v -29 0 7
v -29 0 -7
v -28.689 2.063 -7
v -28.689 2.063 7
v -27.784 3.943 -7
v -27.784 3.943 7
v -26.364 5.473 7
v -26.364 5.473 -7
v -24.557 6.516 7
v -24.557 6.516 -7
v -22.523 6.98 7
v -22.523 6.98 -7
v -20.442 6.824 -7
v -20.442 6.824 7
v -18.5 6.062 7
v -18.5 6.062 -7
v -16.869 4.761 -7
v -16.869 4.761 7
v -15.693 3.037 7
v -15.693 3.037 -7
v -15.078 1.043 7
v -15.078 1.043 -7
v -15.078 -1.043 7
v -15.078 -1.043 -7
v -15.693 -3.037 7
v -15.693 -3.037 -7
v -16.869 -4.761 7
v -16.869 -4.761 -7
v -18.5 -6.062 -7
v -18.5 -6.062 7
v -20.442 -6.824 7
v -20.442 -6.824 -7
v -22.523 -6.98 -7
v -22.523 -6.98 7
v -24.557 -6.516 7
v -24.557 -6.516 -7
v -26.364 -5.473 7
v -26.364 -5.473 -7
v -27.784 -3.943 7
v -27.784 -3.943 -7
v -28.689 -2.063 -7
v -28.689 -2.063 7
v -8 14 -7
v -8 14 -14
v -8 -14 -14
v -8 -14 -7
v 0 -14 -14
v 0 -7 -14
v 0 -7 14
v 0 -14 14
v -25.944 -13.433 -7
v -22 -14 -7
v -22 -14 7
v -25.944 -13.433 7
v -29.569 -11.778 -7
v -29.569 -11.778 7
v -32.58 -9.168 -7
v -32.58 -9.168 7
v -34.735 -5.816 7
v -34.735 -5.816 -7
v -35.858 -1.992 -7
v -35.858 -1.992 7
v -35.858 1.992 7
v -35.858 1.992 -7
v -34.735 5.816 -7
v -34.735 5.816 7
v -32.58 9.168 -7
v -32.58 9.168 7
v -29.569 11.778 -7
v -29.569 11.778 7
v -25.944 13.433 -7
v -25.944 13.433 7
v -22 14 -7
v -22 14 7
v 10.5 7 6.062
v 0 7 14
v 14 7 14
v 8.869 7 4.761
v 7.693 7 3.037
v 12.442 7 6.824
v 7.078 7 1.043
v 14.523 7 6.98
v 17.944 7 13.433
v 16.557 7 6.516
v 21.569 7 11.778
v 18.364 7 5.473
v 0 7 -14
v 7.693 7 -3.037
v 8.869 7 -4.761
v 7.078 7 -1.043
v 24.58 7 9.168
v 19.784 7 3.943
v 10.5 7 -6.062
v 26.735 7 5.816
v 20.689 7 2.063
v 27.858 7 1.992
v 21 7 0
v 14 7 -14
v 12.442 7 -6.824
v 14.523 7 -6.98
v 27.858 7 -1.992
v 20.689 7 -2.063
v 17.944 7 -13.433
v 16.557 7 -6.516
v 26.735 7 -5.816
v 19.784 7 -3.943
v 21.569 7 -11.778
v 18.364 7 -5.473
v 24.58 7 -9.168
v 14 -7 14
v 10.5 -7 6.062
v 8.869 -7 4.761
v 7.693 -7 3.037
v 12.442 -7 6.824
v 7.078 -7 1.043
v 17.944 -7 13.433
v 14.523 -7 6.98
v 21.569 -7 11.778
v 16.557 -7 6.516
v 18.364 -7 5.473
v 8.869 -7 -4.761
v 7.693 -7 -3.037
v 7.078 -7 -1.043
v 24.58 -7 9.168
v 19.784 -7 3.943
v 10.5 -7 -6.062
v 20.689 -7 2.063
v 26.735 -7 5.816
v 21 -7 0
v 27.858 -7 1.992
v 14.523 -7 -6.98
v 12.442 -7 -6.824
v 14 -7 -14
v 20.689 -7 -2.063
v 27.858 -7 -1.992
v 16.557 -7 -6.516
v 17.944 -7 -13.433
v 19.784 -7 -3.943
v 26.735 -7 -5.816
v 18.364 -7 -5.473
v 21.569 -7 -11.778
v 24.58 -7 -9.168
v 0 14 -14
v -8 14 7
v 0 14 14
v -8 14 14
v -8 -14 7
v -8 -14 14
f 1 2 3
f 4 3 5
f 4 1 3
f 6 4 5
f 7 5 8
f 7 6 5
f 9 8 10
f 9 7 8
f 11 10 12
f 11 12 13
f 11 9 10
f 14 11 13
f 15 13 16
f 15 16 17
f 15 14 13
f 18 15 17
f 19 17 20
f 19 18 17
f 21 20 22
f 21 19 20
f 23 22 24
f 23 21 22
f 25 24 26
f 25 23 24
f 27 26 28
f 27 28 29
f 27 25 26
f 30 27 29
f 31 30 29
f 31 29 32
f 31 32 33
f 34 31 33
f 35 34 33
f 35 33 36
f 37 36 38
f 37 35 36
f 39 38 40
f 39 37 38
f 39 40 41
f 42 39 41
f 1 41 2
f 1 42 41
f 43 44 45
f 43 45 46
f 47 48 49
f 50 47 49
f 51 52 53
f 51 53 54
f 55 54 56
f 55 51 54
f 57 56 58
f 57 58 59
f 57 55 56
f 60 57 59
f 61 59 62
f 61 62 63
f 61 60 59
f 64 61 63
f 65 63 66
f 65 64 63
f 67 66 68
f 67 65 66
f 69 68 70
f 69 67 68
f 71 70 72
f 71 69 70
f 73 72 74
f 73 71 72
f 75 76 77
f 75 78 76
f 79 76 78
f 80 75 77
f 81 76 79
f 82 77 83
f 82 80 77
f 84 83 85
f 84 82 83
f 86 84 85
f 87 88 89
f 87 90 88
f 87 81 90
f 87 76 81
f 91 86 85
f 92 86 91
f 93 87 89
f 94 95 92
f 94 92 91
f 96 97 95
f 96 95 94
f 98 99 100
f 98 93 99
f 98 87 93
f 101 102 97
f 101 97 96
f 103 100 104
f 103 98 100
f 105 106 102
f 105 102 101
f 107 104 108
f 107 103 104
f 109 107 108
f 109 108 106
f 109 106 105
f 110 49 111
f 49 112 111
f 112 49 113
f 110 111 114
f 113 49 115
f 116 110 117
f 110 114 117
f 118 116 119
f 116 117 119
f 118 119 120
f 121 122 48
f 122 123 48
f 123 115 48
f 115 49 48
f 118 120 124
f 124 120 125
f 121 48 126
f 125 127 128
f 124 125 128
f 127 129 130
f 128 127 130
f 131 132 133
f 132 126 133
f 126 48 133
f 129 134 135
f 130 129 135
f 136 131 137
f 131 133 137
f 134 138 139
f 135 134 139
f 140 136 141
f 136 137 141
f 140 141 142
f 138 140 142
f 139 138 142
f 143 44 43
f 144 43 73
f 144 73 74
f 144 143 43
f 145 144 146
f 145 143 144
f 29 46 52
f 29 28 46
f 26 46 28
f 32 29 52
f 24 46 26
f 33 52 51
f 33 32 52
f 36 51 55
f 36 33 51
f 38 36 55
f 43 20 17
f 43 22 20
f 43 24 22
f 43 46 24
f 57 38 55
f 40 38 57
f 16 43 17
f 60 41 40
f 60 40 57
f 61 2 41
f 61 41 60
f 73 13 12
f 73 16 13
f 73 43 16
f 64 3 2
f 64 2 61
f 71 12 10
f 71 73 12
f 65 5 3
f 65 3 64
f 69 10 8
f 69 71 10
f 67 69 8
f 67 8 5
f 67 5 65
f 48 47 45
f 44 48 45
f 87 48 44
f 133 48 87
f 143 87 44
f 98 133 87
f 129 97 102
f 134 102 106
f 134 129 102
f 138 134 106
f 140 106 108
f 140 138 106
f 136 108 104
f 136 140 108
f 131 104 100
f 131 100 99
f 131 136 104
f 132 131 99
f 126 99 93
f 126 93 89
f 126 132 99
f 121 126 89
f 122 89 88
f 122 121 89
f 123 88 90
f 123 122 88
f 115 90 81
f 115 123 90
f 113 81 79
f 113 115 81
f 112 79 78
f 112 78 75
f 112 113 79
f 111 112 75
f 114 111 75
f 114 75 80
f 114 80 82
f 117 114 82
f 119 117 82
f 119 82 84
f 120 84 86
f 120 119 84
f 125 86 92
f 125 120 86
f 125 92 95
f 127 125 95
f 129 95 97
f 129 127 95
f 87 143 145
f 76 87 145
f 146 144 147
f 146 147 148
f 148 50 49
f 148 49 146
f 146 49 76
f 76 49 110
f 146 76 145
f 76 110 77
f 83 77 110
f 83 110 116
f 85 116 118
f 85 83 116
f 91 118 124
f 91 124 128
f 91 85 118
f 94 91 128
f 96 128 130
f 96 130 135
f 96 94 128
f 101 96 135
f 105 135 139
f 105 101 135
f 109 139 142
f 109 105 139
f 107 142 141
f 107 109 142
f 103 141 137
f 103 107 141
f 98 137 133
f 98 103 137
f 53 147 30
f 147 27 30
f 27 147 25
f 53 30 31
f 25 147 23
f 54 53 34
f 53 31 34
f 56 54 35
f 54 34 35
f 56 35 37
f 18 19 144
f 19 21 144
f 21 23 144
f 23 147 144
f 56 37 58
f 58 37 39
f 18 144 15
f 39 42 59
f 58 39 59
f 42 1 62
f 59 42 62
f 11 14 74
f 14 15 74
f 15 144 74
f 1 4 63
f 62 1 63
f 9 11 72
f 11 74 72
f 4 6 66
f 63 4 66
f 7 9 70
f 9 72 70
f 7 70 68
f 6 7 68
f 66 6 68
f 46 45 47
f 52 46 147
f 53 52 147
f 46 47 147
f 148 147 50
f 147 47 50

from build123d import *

# Parameters (mm, degrees)
SKETCH1_R           = 7
BOSS_EXTRUDE1_DEPTH = 7
SKETCH2_W           = 28
SKETCH2_H           = 28
BOSS_EXTRUDE2_DEPTH = 8
SKETCH3_R           = 7
BOSS_EXTRUDE3_DEPTH = 7


with BuildPart() as part:
    # Sketch1 → Boss-Extrude1 (new body, symmetric)
    with BuildSketch(Plane(origin=(0, 0, 0), x_dir=(1, 0, 0), z_dir=(0, 1, 0))):
        with BuildLine():
            Line((0, 14), (0, -14))
            Line((0, -14), (14, -14))
            ThreePointArc((14, -14), (28, 0), (14, 14))
            Line((14, 14), (0, 14))
        make_face()
        with Locations((14, 0)):
            Circle(SKETCH1_R, mode=Mode.SUBTRACT)
    extrude(amount=BOSS_EXTRUDE1_DEPTH, both=True)

    # Sketch2 → Boss-Extrude2 (add)
    with BuildSketch(Plane.ZY):
        Rectangle(SKETCH2_W, SKETCH2_H)
    extrude(amount=BOSS_EXTRUDE2_DEPTH)

    # Sketch3 → Boss-Extrude3 (add, symmetric)
    with BuildSketch(Plane(origin=(0, 0, 0), x_dir=(-1, 0, 0), z_dir=(0, 0, -1))):
        with BuildLine():
            Line((8, 14), (8, -14))
            Line((8, -14), (22, -14))
            ThreePointArc((22, -14), (36, 0), (22, 14))
            Line((22, 14), (8, 14))
        make_face()
        with Locations((22, 0)):
            Circle(SKETCH3_R, mode=Mode.SUBTRACT)
    extrude(amount=BOSS_EXTRUDE3_DEPTH, both=True)


solid = part.part
